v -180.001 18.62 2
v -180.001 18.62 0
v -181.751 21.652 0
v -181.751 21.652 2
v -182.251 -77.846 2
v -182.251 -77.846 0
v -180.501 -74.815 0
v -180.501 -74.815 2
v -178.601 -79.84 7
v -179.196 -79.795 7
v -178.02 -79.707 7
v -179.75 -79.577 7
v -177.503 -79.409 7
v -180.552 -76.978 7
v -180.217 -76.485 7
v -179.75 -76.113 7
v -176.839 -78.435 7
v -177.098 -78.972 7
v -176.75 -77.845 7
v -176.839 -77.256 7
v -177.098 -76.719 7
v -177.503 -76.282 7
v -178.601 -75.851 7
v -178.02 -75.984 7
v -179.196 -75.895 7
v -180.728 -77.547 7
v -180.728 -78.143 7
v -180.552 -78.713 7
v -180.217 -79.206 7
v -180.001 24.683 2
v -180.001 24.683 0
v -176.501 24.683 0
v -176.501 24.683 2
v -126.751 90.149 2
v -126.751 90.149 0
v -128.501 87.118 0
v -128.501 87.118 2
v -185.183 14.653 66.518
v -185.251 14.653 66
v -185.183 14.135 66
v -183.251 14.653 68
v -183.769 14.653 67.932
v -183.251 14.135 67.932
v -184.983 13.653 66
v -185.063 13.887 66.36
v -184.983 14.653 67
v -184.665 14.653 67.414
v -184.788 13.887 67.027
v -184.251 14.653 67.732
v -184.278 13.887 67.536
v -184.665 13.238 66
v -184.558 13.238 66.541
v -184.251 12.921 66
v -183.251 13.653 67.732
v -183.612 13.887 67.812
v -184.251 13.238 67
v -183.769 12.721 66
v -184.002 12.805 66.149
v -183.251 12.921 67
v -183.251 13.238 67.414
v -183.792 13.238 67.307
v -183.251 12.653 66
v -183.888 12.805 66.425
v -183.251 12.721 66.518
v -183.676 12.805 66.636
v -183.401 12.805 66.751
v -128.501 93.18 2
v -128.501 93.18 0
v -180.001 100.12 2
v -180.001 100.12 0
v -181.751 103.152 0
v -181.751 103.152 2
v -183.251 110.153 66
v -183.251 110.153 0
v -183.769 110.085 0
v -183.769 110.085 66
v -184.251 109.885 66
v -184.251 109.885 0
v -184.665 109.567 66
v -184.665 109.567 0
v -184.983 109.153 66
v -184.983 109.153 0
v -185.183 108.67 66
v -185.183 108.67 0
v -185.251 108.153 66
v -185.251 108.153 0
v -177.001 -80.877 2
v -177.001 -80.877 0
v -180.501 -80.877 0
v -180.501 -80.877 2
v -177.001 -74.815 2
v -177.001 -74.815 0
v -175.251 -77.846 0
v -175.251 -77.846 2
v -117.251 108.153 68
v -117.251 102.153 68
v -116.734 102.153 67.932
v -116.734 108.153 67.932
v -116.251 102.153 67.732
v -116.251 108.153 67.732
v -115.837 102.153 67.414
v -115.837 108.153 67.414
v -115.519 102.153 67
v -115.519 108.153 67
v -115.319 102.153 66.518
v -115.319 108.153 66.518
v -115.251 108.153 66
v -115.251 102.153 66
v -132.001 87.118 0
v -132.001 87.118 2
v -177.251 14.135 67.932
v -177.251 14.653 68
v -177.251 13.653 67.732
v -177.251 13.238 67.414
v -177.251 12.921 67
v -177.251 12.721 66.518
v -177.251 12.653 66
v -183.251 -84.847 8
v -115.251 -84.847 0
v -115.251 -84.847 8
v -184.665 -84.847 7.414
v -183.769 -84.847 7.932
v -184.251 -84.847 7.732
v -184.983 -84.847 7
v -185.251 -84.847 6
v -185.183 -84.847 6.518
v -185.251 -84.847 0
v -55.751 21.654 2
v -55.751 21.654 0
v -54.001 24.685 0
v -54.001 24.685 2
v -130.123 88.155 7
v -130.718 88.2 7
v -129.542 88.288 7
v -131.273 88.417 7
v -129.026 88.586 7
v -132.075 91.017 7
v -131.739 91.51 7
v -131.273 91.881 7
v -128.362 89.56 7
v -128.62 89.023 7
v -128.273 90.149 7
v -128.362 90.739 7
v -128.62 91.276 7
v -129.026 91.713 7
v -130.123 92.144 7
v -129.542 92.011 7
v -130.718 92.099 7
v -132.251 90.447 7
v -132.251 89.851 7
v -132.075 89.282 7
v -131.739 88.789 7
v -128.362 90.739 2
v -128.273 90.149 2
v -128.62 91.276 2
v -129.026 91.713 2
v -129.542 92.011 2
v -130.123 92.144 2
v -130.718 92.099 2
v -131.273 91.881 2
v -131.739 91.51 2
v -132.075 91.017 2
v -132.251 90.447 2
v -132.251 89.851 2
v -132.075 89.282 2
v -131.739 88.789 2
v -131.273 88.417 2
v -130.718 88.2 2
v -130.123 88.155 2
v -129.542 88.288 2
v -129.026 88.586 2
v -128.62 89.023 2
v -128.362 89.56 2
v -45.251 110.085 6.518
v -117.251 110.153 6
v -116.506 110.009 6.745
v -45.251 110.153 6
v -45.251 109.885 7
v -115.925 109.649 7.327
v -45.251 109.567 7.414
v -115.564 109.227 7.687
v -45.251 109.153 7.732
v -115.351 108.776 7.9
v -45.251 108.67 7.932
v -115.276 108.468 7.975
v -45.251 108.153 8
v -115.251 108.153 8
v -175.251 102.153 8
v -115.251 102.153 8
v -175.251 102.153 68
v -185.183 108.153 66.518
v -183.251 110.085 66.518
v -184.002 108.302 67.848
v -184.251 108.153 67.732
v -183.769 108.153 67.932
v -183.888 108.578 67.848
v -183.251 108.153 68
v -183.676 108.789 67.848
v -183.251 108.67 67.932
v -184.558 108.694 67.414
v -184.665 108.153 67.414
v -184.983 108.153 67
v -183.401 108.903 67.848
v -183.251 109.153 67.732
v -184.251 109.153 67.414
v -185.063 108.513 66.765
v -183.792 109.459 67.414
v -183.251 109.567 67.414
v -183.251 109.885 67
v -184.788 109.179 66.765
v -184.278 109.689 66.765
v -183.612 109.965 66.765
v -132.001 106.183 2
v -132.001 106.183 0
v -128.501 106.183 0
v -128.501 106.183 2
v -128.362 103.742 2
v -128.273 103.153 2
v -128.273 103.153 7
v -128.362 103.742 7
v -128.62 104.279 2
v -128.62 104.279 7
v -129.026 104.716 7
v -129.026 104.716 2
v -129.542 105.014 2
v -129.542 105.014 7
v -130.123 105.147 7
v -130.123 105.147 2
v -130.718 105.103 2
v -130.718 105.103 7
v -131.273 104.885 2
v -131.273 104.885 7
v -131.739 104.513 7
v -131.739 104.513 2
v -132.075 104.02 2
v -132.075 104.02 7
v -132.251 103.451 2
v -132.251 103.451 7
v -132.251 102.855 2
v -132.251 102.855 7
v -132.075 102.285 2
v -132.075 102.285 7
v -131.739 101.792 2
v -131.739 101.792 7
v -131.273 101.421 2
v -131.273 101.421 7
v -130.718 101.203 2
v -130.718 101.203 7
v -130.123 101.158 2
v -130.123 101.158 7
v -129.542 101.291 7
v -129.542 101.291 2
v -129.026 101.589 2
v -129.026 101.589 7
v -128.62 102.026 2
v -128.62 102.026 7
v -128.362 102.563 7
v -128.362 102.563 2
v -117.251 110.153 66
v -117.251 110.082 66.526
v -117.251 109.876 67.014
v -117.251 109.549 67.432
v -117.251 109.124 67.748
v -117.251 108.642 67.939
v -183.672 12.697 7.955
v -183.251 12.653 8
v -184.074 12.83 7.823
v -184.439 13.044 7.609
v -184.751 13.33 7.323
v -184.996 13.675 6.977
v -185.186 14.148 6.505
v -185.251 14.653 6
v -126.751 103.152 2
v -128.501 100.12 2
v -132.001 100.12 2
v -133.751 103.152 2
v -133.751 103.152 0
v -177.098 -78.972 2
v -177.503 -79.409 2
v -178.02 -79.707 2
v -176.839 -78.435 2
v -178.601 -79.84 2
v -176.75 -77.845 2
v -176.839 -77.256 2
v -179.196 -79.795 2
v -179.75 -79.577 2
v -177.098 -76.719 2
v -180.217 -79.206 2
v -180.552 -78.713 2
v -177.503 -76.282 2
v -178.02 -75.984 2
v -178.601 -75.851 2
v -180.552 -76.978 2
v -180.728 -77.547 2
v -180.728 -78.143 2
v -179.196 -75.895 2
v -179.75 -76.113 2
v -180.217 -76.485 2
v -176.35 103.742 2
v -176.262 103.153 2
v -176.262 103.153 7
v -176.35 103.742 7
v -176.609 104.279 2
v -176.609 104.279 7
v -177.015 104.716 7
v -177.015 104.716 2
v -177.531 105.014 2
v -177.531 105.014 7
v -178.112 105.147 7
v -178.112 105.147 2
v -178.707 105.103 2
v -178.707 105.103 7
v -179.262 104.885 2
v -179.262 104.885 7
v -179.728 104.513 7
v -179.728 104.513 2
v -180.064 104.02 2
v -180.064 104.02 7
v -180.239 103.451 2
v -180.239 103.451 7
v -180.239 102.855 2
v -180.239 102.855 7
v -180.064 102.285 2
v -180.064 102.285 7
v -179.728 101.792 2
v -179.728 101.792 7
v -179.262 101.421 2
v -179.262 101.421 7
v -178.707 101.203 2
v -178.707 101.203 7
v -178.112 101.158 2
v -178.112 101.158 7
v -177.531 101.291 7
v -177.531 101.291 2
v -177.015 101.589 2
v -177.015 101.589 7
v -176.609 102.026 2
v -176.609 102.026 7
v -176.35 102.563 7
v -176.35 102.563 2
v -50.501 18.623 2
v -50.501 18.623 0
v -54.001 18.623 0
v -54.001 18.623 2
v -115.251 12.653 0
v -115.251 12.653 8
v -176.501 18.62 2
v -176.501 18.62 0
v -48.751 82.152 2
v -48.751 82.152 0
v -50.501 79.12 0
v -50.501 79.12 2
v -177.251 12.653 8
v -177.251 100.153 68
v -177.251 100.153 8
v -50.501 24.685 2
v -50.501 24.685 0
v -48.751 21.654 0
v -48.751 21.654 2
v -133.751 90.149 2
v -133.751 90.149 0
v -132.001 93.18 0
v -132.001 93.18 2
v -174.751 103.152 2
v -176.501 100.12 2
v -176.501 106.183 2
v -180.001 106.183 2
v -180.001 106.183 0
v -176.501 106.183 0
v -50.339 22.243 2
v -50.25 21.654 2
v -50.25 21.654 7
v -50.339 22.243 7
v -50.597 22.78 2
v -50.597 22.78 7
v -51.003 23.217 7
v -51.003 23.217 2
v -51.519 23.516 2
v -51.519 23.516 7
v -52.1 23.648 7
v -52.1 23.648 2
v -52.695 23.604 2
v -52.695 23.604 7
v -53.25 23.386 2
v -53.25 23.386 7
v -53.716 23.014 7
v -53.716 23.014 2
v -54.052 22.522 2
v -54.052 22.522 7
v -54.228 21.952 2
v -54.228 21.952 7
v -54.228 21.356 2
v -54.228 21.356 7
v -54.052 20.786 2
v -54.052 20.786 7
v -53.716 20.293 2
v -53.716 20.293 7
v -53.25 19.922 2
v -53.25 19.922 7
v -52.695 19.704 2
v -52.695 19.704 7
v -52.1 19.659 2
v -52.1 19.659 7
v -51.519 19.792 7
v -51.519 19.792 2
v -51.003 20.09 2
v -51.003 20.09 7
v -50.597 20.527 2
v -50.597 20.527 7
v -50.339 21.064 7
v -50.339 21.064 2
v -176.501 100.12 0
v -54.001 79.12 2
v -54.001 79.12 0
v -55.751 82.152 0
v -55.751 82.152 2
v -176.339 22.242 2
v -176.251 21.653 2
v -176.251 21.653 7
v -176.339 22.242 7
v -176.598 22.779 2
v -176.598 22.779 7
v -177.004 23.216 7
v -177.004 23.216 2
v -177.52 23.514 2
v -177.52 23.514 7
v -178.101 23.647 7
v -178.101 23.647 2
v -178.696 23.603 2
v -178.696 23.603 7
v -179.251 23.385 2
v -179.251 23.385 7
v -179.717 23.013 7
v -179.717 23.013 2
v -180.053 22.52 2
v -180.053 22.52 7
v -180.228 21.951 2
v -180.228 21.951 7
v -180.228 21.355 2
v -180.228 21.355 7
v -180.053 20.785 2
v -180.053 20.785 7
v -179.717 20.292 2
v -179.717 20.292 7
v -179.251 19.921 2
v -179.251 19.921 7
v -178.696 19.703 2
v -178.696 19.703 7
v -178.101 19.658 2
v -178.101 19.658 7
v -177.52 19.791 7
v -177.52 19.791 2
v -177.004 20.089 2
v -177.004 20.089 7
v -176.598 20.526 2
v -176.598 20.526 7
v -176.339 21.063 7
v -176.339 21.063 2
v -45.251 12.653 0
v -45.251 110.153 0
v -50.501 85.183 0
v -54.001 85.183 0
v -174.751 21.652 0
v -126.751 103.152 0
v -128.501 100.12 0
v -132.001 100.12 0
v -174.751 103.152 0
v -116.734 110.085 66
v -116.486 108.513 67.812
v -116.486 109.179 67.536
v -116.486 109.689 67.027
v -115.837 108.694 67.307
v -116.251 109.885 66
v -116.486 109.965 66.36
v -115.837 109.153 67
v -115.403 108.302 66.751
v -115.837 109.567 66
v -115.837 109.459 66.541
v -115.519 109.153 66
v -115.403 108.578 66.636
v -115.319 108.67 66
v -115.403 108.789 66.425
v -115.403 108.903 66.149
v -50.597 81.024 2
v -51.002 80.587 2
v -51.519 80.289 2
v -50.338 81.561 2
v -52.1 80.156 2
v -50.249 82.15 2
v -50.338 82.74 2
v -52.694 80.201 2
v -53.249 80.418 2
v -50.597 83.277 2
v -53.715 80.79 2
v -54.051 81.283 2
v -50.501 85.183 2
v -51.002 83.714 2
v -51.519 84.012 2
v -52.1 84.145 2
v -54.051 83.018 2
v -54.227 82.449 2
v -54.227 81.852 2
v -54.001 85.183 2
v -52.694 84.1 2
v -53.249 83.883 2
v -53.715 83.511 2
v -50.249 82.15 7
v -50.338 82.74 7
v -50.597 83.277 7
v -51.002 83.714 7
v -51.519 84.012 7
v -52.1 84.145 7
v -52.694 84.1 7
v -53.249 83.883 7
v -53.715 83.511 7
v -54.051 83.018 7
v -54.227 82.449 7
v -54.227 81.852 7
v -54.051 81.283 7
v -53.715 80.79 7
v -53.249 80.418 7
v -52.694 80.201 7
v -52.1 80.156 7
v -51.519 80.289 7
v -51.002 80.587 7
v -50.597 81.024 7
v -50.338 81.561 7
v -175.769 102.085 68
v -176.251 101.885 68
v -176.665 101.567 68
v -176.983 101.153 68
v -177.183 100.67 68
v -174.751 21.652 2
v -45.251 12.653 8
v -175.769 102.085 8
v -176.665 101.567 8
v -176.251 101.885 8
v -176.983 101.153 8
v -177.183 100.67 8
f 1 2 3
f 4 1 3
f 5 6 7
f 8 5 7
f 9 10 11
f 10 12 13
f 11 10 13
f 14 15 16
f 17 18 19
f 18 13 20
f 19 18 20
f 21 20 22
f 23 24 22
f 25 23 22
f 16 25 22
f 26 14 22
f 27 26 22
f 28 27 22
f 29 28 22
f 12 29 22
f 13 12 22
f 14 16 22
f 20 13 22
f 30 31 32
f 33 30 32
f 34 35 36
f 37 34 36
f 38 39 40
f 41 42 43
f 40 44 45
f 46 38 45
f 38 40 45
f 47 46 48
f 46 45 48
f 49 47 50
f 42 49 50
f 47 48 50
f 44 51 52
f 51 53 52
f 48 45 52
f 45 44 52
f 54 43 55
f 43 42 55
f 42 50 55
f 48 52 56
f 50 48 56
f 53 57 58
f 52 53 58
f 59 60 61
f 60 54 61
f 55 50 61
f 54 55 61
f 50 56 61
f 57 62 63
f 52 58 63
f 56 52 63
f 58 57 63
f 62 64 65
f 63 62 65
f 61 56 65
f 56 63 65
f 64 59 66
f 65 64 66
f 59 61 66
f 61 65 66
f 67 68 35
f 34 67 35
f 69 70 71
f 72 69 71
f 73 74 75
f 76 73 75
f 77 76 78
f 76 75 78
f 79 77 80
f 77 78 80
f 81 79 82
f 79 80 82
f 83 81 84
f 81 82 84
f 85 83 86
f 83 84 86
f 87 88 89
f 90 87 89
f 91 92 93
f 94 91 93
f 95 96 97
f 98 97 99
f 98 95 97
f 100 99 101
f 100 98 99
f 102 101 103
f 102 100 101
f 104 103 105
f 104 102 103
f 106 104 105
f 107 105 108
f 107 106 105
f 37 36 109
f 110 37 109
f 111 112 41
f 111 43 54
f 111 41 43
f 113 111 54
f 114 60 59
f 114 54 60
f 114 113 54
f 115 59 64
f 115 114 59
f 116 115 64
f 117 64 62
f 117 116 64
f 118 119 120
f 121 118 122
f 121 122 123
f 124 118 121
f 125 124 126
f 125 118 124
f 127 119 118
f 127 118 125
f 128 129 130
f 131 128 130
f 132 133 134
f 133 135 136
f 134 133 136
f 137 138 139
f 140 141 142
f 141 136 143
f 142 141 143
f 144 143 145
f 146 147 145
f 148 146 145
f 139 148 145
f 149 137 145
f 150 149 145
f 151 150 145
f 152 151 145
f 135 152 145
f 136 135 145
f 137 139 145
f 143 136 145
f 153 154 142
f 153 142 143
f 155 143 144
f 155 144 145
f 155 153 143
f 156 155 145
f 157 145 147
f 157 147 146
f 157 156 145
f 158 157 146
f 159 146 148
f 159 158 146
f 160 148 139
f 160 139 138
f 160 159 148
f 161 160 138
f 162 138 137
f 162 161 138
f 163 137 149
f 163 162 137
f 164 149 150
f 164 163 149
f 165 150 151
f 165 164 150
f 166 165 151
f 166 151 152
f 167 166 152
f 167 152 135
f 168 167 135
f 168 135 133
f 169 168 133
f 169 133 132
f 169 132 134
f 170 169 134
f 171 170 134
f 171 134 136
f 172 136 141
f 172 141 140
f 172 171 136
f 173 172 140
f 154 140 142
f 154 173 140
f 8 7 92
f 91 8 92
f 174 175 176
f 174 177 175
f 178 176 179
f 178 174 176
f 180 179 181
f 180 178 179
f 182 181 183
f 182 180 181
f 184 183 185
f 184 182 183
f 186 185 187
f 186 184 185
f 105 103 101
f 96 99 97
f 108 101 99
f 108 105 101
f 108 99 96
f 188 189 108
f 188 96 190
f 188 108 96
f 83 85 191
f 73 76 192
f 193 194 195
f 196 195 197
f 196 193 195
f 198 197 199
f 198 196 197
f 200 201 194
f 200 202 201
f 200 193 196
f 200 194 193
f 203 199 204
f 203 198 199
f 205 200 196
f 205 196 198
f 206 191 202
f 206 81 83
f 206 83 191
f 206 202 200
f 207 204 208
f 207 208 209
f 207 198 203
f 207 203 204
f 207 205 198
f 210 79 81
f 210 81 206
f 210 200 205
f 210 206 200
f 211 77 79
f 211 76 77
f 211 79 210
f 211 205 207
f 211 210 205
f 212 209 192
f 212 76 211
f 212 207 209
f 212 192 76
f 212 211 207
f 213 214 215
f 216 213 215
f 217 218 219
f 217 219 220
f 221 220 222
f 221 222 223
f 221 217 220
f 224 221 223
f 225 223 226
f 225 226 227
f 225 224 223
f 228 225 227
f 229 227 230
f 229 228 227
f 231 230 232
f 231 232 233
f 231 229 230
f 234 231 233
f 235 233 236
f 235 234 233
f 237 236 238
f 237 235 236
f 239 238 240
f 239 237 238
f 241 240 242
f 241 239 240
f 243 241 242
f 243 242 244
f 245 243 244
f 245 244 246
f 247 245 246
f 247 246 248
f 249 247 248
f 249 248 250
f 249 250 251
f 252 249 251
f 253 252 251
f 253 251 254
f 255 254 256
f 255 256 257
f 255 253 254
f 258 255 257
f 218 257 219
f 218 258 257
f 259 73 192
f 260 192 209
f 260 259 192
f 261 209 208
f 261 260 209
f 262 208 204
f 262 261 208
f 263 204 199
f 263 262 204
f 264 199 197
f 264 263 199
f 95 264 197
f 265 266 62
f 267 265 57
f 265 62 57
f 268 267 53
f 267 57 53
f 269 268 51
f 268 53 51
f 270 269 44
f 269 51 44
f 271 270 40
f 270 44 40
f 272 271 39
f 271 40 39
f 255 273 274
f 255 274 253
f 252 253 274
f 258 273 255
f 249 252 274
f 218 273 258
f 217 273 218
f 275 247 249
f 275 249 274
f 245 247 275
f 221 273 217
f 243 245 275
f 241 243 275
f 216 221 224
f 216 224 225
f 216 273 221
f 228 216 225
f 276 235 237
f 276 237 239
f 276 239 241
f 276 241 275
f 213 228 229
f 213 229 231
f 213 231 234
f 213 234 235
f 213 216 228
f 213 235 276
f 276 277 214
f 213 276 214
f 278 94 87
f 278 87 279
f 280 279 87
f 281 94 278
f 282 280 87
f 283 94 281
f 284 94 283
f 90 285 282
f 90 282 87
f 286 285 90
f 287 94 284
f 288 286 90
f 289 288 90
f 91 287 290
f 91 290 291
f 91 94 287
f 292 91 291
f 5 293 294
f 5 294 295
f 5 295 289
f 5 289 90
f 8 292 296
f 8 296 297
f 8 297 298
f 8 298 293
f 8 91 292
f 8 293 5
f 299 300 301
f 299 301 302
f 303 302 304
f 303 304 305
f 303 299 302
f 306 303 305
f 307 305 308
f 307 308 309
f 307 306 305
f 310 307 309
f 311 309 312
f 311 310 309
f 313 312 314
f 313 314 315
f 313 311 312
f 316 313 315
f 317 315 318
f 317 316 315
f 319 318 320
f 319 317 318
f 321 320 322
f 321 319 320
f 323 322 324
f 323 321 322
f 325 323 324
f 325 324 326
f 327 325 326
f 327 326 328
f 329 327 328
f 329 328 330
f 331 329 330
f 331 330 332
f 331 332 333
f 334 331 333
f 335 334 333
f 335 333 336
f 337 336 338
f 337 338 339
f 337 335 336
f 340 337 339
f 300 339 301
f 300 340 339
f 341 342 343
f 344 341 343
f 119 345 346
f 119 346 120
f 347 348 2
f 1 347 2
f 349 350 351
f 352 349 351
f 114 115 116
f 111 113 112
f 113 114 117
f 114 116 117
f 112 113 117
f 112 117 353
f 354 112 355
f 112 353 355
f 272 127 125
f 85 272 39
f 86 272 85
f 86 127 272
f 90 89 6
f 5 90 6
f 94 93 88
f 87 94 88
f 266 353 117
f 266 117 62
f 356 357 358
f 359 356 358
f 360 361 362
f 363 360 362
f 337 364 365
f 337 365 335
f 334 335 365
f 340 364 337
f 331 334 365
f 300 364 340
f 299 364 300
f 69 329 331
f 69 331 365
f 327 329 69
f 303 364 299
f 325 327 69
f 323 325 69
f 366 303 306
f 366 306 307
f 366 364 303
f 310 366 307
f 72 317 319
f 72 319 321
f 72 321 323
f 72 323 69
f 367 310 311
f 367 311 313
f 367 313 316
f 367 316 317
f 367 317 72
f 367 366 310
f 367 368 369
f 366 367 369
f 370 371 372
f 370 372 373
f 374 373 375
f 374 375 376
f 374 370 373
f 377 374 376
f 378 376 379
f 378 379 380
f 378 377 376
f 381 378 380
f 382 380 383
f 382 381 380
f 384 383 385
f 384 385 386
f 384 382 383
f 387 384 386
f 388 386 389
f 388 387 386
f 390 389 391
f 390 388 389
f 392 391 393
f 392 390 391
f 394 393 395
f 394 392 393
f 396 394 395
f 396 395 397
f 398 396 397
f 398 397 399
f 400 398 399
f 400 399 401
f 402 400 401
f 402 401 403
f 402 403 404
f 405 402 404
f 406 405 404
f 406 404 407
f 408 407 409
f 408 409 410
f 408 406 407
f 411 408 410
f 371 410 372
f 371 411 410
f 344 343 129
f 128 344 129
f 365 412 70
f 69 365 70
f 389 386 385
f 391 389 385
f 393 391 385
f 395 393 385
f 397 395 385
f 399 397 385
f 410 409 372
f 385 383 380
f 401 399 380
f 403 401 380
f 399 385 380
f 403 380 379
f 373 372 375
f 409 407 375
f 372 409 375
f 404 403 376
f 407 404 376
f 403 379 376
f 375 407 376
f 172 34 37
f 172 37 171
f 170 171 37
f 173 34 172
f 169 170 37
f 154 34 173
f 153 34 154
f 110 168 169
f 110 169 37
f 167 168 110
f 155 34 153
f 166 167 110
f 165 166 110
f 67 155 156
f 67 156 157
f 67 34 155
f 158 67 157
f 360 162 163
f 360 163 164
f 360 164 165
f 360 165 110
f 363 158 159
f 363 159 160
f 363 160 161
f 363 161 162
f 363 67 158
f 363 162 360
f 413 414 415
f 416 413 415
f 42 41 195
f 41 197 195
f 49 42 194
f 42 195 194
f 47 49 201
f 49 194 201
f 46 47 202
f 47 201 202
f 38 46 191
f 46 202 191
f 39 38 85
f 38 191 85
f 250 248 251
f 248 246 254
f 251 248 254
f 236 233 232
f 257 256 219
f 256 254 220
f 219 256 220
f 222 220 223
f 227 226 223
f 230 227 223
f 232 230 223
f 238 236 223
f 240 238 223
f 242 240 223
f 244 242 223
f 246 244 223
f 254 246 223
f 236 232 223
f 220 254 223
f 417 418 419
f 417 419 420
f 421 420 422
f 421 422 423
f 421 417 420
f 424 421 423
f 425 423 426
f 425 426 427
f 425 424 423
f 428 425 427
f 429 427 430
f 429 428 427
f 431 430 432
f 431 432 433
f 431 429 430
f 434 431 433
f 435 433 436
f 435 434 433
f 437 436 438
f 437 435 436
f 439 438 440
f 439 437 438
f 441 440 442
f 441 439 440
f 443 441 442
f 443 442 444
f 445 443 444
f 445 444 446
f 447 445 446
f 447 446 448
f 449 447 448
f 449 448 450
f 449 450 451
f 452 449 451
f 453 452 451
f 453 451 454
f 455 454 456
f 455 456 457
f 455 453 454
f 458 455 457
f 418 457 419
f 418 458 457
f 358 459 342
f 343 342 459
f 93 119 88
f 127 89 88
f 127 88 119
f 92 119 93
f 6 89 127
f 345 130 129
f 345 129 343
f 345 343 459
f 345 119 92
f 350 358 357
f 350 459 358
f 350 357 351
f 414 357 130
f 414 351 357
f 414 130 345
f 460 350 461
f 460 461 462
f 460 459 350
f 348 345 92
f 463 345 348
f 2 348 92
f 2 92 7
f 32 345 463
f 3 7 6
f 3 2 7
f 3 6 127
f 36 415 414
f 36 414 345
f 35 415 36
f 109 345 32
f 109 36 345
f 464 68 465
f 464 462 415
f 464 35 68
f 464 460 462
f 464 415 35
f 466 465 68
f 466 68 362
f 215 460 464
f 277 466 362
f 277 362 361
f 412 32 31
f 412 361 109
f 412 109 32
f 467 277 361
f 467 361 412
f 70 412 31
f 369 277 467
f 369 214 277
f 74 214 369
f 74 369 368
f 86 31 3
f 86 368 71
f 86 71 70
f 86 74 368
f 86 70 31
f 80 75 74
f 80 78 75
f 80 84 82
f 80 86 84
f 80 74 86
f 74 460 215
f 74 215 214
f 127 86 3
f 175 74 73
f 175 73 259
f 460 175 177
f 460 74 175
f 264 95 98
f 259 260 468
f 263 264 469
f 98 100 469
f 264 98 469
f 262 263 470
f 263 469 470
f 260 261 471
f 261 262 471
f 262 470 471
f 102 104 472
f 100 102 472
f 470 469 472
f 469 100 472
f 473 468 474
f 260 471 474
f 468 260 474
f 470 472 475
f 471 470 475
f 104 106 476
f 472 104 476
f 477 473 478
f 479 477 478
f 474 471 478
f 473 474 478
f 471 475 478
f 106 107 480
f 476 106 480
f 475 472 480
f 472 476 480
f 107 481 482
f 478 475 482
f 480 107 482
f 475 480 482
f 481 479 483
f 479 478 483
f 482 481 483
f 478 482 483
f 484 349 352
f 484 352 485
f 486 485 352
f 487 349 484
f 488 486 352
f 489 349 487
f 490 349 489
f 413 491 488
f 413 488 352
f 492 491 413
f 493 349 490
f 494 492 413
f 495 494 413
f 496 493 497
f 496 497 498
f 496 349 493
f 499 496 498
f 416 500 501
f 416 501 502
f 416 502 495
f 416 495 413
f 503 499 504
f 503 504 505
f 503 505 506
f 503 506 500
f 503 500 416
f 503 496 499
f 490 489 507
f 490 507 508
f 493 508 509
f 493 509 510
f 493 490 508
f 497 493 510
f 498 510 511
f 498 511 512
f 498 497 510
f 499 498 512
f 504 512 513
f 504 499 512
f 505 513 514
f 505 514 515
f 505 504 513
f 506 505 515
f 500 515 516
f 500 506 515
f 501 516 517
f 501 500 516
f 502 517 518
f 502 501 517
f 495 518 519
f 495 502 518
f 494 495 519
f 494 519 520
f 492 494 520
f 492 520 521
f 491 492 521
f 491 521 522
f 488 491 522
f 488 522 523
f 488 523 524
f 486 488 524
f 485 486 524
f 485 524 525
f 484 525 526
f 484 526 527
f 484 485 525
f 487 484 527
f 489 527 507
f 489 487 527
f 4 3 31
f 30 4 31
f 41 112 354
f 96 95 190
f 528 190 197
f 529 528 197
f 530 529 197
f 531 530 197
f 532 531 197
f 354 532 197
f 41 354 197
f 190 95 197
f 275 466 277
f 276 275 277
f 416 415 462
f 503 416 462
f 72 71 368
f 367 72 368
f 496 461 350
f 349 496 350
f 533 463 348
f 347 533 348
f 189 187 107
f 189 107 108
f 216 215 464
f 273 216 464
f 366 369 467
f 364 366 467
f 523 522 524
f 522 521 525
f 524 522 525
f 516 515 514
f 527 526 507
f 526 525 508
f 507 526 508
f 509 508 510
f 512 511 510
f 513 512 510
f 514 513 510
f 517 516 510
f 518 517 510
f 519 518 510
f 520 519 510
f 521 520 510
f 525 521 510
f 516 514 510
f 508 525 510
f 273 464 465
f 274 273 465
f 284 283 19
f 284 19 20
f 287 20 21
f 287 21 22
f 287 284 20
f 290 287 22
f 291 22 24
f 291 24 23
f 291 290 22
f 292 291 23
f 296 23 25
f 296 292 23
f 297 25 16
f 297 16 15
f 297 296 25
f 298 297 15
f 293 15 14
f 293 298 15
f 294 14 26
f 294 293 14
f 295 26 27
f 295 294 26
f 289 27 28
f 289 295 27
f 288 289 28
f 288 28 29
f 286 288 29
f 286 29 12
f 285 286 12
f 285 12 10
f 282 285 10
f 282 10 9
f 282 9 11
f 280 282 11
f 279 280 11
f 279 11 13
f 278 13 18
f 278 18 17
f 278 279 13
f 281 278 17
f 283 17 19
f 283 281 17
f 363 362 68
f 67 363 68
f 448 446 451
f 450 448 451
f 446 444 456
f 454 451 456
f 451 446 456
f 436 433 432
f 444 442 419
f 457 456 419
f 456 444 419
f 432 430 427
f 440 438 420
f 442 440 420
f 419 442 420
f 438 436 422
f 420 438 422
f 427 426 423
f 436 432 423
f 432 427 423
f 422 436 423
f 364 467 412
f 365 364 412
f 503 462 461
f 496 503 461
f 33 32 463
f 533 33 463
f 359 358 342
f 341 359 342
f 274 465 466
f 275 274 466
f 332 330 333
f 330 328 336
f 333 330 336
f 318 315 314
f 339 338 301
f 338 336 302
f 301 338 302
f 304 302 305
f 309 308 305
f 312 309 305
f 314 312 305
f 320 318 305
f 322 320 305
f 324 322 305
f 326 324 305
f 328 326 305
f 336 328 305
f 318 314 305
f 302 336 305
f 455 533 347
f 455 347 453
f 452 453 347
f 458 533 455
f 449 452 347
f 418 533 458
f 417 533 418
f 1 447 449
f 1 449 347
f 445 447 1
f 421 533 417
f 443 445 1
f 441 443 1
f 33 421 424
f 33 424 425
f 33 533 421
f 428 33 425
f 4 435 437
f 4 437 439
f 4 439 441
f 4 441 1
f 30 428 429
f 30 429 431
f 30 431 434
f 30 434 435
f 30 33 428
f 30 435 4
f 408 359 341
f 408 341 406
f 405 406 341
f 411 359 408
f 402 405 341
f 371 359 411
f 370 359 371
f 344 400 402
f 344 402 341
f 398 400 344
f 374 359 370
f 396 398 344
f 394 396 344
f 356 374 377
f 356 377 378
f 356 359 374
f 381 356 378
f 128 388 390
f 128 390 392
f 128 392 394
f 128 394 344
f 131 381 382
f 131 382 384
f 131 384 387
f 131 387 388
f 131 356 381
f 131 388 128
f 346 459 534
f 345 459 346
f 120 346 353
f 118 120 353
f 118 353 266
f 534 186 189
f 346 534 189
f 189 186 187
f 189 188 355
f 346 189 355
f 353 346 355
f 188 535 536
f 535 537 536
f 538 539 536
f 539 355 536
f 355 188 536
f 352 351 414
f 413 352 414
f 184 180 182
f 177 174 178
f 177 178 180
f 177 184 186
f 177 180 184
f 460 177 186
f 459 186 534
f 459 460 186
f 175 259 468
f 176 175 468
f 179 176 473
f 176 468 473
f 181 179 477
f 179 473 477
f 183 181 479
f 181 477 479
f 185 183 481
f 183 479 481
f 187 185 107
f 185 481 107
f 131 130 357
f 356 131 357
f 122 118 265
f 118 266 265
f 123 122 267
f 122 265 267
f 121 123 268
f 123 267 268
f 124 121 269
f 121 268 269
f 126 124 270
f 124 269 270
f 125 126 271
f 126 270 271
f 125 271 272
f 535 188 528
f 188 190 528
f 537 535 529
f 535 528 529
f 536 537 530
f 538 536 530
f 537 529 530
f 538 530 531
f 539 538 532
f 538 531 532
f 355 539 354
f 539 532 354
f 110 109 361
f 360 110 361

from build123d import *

# Parameters (mm, degrees)
EXTRUDE_1_DEPTH          = 8
CUT_EXTRUDE_2_DEPTH      = 2
CUT_EXTRUDE_2_DEPTH_BACK = 160.263611885
SKETCH_4_R               = 2
CUT_EXTRUDE_7_DEPTH      = 5
SKETCH_5_W               = 8
SKETCH_5_H               = 89.5
EXTRUDE_3_DEPTH          = 60
FILLET_1_R               = 2
FILLET_2_R               = 2
FILLET_3_R               = 2


with BuildPart() as part:
    # 스케치1 → 보스-돌출1 (new body)
    with BuildSketch(Plane.XY):
        Polygon((114.748799453, 110.152671756), (44.748799453, 110.152671756), (-25.251200547, 110.152671756), (-25.251200547, 12.652671756), (44.748799453, 12.652671756), (44.748799453, -84.847328244), (114.748799453, -84.847328244), (114.748799453, 12.652671756), align=None)
    extrude(amount=EXTRUDE_1_DEPTH)

    # 스케치3 → 컷-돌출2 (cut, two sides: drawn at the far end of the back side and taken through both)
    with BuildSketch(Plane.XY.offset(-CUT_EXTRUDE_2_DEPTH_BACK)):
        Polygon((104.248799453, 103.151582842), (105.998799453, 100.120493929), (109.498799453, 100.120493929), (111.248799453, 103.151582842), (109.498799453, 106.182671756), (105.998799453, 106.182671756), align=None)
        Polygon((-21.751200547, 82.151582842), (-20.001200547, 79.120493929), (-16.501200547, 79.120493929), (-14.751200547, 82.151582842), (-16.501200547, 85.182671756), (-20.001200547, 85.182671756), align=None)
        Polygon((-21.751200547, 21.653760669), (-20.001200547, 18.622671756), (-16.501200547, 18.622671756), (-14.751200547, 21.653760669), (-16.501200547, 24.684849582), (-20.001200547, 24.684849582), align=None)
        Polygon((57.998799453, 100.120493929), (61.498799453, 100.120493929), (63.248799453, 103.151582842), (61.498799453, 106.182671756), (57.998799453, 106.182671756), (56.248799453, 103.151582842), align=None)
        Polygon((57.998799453, 93.180493929), (56.248799453, 90.149405016), (57.998799453, 87.118316103), (61.498799453, 87.118316103), (63.248799453, 90.149405016), (61.498799453, 93.180493929), align=None)
        Polygon((104.748799453, -77.846239331), (106.498799453, -80.877328244), (109.998799453, -80.877328244), (111.748799453, -77.846239331), (109.998799453, -74.815150418), (106.498799453, -74.815150418), align=None)
        Polygon((109.498799453, 18.620493929), (111.248799453, 21.651582842), (109.498799453, 24.682671756), (105.998799453, 24.682671756), (104.248799453, 21.651582842), (105.998799453, 18.620493929), align=None)
    extrude(amount=CUT_EXTRUDE_2_DEPTH + CUT_EXTRUDE_2_DEPTH_BACK, mode=Mode.SUBTRACT)

    # 스케치4 → 컷-돌출7 (cut)
    with BuildSketch(Plane(origin=(0, 0, 2), x_dir=(-1, 0, 0), z_dir=(0, 0, -1))):
        with Locations((-59.770469927, 103.152671756)):
            Circle(SKETCH_4_R)
        with Locations((-59.770469927, 90.149405016)):
            Circle(SKETCH_4_R)
        with Locations((-107.759162368, 103.152671756)):
            Circle(SKETCH_4_R)
        with Locations((-108.2480681, -77.845328244)):
            Circle(SKETCH_4_R)
        with Locations((-107.748170768, 21.652671756)):
            Circle(SKETCH_4_R)
        with Locations((18.252457916, 21.653760669)):
            Circle(SKETCH_4_R)
        with Locations((18.2530866, 82.150493929)):
            Circle(SKETCH_4_R)
    extrude(amount=-CUT_EXTRUDE_7_DEPTH, mode=Mode.SUBTRACT)

    # 스케치5 → 보스-돌출3 (add)
    with BuildSketch(Plane.XY.offset(8)):
        Polygon((114.748799453, 102.152671756), (114.748799453, 110.152671756), (44.748799453, 110.152671756), (44.748799453, 102.152671756), (106.748799453, 102.152671756), align=None)
        with Locations((110.748799453, 57.402671756)):
            Rectangle(SKETCH_5_W, SKETCH_5_H)
    extrude(amount=EXTRUDE_3_DEPTH)

    # 필렛1
    fillet_1_edges = [part.edges().sort_by_distance(p)[0] for p in [
        (114.748799453, 110.152671756, 34),
        (9.748799453, 110.152671756, 8),
        (114.748799453, -36.097328244, 8),
        (114.748799453, 61.402671756, 68),
        (79.748799453, 110.152671756, 68),
        (114.748799453, 12.652671756, 38),
        (44.748799453, 110.152671756, 38),
    ]]
    fillet(fillet_1_edges, radius=FILLET_1_R)

    # 필렛2
    # the kernel refuses this fillet: 2 mm, written as the material it takes off along each edge
    with BuildSketch(Plane(origin=(46.748799453, 108.152671756, 66), x_dir=(0, 0, 1), z_dir=(-1, 0, 0))) as fillet_2_piece_1_section:
        Polygon((0, 0), (FILLET_2_R, 0), (FILLET_2_R, FILLET_2_R), (0, FILLET_2_R), align=None)
    fillet_2_piece_1 = extrude(amount=FILLET_2_R, mode=Mode.PRIVATE)
    fillet_2_piece_1 = fillet_2_piece_1 - Plane(origin=(46.748799453, 108.152671756, 66), x_dir=(0, -0.7071067811865475, -0.7071067811865475), z_dir=(-1, 0, 0)) * Sphere(FILLET_2_R, mode=Mode.PRIVATE)
    add(fillet_2_piece_1, mode=Mode.SUBTRACT)
    with BuildSketch(Plane(origin=(112.748799453, 14.652671756, 66), x_dir=(0, 0, 1), z_dir=(0, -1, 0))) as fillet_2_piece_2_section:
        Polygon((0, 0), (FILLET_2_R, 0), (FILLET_2_R, -FILLET_2_R), (0, -FILLET_2_R), align=None)
    fillet_2_piece_2 = extrude(amount=FILLET_2_R, mode=Mode.PRIVATE)
    fillet_2_piece_2 = fillet_2_piece_2 - Plane(origin=(112.748799453, 14.652671756, 66), x_dir=(-0.7071067811865475, 0, -0.7071067811865475), z_dir=(0, -1, 0)) * Sphere(FILLET_2_R, mode=Mode.PRIVATE)
    add(fillet_2_piece_2, mode=Mode.SUBTRACT)
    with BuildSketch(Plane(origin=(101.748799453, 12.652671756, 68), x_dir=(0, 0, -1), z_dir=(1, 0, 0)), Plane(origin=(44.748799453, 108.152671756, 68), x_dir=(0, 0, -1), z_dir=(0, -1, 0))) as fillet_2_piece_3:
        with BuildLine():
            CenterArc((FILLET_2_R, FILLET_2_R), FILLET_2_R, 180, 90)
            Line((0, FILLET_2_R), (0, 0))
            Line((0, 0), (FILLET_2_R, 0))
        make_face()
    extrude(amount=11, mode=Mode.SUBTRACT)

    # 필렛3
    fillet_3_edges = [part.edges().sort_by_distance(p)[0] for p in [
        (106.748799453, 102.152671756, 38),
    ]]
    fillet(fillet_3_edges, radius=FILLET_3_R)


with BuildPart() as body_2:
    # 대칭 복사1: mirrored copy
    add(part.part.mirror(Plane.ZY.offset(35.251200547)))


solid = body_2.part
